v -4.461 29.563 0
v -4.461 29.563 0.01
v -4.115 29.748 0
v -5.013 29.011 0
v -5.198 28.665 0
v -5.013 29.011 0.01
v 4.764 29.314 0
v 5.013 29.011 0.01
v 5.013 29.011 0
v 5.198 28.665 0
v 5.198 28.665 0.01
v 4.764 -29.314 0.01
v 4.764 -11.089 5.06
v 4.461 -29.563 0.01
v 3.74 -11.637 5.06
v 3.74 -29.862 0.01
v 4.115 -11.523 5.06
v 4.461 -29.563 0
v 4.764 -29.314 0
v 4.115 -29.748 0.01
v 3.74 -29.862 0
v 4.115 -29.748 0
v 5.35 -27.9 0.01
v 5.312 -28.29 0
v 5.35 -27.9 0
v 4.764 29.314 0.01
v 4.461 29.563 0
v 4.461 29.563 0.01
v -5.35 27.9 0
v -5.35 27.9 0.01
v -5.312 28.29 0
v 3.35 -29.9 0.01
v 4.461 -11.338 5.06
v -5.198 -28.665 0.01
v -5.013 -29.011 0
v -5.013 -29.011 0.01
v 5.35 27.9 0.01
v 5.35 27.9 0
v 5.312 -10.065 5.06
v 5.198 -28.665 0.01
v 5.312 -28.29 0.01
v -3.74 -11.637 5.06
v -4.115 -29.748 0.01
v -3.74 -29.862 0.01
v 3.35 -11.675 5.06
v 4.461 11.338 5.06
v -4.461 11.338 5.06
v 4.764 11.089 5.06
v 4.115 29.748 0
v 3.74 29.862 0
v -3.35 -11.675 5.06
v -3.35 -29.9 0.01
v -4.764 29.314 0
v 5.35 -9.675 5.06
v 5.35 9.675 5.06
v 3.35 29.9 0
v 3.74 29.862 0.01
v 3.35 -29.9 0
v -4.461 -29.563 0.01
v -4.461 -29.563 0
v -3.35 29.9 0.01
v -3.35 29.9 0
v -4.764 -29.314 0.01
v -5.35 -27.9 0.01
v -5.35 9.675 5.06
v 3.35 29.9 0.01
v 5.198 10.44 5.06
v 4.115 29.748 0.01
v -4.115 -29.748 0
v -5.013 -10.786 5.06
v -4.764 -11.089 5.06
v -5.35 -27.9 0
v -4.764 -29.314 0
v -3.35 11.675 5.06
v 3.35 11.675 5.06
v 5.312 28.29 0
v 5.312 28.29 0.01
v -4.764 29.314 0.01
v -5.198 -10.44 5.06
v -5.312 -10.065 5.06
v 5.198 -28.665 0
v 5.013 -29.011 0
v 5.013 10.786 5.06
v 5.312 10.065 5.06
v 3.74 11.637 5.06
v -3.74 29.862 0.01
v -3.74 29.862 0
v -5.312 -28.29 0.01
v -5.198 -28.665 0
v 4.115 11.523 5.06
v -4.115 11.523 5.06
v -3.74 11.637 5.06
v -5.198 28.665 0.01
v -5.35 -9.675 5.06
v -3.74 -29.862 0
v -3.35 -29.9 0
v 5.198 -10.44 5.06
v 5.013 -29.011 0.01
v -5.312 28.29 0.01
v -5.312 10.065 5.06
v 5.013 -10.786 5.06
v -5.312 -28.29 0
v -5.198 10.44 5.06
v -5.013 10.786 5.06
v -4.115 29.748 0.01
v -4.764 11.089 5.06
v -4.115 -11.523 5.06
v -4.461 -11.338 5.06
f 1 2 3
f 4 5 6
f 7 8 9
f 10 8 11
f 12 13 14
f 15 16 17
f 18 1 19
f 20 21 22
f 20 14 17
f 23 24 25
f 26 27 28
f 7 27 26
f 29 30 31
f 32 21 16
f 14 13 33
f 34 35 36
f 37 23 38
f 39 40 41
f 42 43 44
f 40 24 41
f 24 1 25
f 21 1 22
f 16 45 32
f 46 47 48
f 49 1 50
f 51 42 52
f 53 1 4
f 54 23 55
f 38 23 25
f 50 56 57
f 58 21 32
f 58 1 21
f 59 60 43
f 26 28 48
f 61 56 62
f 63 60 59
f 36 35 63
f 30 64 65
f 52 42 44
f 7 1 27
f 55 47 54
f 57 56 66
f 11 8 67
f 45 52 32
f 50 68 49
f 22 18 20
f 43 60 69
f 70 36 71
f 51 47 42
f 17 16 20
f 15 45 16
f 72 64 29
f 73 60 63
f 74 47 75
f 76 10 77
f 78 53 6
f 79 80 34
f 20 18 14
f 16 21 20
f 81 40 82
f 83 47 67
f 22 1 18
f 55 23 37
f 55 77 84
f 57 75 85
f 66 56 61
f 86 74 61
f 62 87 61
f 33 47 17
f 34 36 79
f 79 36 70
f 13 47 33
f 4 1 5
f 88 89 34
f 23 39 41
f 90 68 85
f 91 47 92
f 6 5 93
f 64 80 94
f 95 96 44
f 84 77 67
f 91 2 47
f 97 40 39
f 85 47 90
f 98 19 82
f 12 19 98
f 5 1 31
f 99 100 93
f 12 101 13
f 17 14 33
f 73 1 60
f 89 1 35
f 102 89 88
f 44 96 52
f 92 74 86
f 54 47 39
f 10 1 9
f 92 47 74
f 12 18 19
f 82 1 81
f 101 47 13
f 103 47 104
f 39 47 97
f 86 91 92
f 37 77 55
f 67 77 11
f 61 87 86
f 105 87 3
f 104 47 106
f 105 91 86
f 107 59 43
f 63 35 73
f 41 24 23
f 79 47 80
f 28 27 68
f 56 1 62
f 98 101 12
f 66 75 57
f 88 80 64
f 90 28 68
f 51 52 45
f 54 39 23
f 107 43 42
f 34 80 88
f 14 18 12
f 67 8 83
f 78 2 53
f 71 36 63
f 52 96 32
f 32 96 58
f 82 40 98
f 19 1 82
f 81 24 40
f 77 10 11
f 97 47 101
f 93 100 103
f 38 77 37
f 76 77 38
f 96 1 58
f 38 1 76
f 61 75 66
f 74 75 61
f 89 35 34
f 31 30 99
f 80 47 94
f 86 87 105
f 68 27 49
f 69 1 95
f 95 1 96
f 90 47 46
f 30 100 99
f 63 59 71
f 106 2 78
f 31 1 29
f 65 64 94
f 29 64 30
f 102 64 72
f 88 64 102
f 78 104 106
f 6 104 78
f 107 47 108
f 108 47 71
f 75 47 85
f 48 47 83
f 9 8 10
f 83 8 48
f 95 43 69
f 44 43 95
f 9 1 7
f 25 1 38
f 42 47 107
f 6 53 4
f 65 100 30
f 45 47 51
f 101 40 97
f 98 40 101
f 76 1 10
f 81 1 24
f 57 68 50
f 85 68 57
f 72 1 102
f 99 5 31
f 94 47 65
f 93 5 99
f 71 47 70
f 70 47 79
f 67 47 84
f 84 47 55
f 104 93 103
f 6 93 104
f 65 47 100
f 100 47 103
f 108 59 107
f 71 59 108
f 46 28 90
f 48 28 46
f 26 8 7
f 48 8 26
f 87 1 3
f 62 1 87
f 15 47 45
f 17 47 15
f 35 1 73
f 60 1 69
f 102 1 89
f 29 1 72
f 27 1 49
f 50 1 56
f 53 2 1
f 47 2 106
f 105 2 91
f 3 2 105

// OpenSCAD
// Window Foam Block & Pin
// 2025-03-01
$fn = 32;

foam_thick = 12.5; // Foam sheet
cmd_len = 21.8; // Command Strip
cmd_wid = 15.7;
cmd_thick = 0.52;

// Pin Dimensions
pin_rounding = 2.0;
pin_len = cmd_len/2.0;
pin_wid = 60.0;
pin_h = pin_len/2.0;
pin_gap = 0.2;

// Block Dimensions
rounding = 4.0;
block_h = foam_thick + pin_h*1.5 - cmd_thick;
block_len = cmd_len+rounding;
block_wid = cmd_wid;


module blockSolid3D() {
    translate([0,block_h/2.0,0])
    linear_extrude(block_wid)
    offset(rounding) offset(-rounding)
    square([block_len, block_h], center=true);
    
    
}

module pinHole3D() {
    translate([0,foam_thick-cmd_thick+pin_h/2.0,block_wid/2.0])
    cube([pin_len, pin_h, block_wid], center=true);
    
}

module block3D() {
    //cube([10.0, foam_thick-cmd_thick, 20.0]);
    translate([0,-(block_wid+rounding)/2.0,0])
    //rotate([90,0,0])
    difference() {
    blockSolid3D();
    pinHole3D();
    }
}


module pin3D() {
    hull() {
        translate([0,0,pin_h-2*pin_gap])
        linear_extrude(0.01)
        offset(pin_rounding) offset(-pin_rounding)
        square([pin_len-pin_gap, block_wid*1.5-pin_gap], center=true);
        linear_extrude(0.01)
        offset(pin_rounding) offset(-pin_rounding)
        square([pin_len-pin_gap, pin_wid-pin_gap], center=true);
    }
}

//block3D();
//#translate([0,0,foam_thick-cmd_thick+pin_gap/2.0])
pin3D();
